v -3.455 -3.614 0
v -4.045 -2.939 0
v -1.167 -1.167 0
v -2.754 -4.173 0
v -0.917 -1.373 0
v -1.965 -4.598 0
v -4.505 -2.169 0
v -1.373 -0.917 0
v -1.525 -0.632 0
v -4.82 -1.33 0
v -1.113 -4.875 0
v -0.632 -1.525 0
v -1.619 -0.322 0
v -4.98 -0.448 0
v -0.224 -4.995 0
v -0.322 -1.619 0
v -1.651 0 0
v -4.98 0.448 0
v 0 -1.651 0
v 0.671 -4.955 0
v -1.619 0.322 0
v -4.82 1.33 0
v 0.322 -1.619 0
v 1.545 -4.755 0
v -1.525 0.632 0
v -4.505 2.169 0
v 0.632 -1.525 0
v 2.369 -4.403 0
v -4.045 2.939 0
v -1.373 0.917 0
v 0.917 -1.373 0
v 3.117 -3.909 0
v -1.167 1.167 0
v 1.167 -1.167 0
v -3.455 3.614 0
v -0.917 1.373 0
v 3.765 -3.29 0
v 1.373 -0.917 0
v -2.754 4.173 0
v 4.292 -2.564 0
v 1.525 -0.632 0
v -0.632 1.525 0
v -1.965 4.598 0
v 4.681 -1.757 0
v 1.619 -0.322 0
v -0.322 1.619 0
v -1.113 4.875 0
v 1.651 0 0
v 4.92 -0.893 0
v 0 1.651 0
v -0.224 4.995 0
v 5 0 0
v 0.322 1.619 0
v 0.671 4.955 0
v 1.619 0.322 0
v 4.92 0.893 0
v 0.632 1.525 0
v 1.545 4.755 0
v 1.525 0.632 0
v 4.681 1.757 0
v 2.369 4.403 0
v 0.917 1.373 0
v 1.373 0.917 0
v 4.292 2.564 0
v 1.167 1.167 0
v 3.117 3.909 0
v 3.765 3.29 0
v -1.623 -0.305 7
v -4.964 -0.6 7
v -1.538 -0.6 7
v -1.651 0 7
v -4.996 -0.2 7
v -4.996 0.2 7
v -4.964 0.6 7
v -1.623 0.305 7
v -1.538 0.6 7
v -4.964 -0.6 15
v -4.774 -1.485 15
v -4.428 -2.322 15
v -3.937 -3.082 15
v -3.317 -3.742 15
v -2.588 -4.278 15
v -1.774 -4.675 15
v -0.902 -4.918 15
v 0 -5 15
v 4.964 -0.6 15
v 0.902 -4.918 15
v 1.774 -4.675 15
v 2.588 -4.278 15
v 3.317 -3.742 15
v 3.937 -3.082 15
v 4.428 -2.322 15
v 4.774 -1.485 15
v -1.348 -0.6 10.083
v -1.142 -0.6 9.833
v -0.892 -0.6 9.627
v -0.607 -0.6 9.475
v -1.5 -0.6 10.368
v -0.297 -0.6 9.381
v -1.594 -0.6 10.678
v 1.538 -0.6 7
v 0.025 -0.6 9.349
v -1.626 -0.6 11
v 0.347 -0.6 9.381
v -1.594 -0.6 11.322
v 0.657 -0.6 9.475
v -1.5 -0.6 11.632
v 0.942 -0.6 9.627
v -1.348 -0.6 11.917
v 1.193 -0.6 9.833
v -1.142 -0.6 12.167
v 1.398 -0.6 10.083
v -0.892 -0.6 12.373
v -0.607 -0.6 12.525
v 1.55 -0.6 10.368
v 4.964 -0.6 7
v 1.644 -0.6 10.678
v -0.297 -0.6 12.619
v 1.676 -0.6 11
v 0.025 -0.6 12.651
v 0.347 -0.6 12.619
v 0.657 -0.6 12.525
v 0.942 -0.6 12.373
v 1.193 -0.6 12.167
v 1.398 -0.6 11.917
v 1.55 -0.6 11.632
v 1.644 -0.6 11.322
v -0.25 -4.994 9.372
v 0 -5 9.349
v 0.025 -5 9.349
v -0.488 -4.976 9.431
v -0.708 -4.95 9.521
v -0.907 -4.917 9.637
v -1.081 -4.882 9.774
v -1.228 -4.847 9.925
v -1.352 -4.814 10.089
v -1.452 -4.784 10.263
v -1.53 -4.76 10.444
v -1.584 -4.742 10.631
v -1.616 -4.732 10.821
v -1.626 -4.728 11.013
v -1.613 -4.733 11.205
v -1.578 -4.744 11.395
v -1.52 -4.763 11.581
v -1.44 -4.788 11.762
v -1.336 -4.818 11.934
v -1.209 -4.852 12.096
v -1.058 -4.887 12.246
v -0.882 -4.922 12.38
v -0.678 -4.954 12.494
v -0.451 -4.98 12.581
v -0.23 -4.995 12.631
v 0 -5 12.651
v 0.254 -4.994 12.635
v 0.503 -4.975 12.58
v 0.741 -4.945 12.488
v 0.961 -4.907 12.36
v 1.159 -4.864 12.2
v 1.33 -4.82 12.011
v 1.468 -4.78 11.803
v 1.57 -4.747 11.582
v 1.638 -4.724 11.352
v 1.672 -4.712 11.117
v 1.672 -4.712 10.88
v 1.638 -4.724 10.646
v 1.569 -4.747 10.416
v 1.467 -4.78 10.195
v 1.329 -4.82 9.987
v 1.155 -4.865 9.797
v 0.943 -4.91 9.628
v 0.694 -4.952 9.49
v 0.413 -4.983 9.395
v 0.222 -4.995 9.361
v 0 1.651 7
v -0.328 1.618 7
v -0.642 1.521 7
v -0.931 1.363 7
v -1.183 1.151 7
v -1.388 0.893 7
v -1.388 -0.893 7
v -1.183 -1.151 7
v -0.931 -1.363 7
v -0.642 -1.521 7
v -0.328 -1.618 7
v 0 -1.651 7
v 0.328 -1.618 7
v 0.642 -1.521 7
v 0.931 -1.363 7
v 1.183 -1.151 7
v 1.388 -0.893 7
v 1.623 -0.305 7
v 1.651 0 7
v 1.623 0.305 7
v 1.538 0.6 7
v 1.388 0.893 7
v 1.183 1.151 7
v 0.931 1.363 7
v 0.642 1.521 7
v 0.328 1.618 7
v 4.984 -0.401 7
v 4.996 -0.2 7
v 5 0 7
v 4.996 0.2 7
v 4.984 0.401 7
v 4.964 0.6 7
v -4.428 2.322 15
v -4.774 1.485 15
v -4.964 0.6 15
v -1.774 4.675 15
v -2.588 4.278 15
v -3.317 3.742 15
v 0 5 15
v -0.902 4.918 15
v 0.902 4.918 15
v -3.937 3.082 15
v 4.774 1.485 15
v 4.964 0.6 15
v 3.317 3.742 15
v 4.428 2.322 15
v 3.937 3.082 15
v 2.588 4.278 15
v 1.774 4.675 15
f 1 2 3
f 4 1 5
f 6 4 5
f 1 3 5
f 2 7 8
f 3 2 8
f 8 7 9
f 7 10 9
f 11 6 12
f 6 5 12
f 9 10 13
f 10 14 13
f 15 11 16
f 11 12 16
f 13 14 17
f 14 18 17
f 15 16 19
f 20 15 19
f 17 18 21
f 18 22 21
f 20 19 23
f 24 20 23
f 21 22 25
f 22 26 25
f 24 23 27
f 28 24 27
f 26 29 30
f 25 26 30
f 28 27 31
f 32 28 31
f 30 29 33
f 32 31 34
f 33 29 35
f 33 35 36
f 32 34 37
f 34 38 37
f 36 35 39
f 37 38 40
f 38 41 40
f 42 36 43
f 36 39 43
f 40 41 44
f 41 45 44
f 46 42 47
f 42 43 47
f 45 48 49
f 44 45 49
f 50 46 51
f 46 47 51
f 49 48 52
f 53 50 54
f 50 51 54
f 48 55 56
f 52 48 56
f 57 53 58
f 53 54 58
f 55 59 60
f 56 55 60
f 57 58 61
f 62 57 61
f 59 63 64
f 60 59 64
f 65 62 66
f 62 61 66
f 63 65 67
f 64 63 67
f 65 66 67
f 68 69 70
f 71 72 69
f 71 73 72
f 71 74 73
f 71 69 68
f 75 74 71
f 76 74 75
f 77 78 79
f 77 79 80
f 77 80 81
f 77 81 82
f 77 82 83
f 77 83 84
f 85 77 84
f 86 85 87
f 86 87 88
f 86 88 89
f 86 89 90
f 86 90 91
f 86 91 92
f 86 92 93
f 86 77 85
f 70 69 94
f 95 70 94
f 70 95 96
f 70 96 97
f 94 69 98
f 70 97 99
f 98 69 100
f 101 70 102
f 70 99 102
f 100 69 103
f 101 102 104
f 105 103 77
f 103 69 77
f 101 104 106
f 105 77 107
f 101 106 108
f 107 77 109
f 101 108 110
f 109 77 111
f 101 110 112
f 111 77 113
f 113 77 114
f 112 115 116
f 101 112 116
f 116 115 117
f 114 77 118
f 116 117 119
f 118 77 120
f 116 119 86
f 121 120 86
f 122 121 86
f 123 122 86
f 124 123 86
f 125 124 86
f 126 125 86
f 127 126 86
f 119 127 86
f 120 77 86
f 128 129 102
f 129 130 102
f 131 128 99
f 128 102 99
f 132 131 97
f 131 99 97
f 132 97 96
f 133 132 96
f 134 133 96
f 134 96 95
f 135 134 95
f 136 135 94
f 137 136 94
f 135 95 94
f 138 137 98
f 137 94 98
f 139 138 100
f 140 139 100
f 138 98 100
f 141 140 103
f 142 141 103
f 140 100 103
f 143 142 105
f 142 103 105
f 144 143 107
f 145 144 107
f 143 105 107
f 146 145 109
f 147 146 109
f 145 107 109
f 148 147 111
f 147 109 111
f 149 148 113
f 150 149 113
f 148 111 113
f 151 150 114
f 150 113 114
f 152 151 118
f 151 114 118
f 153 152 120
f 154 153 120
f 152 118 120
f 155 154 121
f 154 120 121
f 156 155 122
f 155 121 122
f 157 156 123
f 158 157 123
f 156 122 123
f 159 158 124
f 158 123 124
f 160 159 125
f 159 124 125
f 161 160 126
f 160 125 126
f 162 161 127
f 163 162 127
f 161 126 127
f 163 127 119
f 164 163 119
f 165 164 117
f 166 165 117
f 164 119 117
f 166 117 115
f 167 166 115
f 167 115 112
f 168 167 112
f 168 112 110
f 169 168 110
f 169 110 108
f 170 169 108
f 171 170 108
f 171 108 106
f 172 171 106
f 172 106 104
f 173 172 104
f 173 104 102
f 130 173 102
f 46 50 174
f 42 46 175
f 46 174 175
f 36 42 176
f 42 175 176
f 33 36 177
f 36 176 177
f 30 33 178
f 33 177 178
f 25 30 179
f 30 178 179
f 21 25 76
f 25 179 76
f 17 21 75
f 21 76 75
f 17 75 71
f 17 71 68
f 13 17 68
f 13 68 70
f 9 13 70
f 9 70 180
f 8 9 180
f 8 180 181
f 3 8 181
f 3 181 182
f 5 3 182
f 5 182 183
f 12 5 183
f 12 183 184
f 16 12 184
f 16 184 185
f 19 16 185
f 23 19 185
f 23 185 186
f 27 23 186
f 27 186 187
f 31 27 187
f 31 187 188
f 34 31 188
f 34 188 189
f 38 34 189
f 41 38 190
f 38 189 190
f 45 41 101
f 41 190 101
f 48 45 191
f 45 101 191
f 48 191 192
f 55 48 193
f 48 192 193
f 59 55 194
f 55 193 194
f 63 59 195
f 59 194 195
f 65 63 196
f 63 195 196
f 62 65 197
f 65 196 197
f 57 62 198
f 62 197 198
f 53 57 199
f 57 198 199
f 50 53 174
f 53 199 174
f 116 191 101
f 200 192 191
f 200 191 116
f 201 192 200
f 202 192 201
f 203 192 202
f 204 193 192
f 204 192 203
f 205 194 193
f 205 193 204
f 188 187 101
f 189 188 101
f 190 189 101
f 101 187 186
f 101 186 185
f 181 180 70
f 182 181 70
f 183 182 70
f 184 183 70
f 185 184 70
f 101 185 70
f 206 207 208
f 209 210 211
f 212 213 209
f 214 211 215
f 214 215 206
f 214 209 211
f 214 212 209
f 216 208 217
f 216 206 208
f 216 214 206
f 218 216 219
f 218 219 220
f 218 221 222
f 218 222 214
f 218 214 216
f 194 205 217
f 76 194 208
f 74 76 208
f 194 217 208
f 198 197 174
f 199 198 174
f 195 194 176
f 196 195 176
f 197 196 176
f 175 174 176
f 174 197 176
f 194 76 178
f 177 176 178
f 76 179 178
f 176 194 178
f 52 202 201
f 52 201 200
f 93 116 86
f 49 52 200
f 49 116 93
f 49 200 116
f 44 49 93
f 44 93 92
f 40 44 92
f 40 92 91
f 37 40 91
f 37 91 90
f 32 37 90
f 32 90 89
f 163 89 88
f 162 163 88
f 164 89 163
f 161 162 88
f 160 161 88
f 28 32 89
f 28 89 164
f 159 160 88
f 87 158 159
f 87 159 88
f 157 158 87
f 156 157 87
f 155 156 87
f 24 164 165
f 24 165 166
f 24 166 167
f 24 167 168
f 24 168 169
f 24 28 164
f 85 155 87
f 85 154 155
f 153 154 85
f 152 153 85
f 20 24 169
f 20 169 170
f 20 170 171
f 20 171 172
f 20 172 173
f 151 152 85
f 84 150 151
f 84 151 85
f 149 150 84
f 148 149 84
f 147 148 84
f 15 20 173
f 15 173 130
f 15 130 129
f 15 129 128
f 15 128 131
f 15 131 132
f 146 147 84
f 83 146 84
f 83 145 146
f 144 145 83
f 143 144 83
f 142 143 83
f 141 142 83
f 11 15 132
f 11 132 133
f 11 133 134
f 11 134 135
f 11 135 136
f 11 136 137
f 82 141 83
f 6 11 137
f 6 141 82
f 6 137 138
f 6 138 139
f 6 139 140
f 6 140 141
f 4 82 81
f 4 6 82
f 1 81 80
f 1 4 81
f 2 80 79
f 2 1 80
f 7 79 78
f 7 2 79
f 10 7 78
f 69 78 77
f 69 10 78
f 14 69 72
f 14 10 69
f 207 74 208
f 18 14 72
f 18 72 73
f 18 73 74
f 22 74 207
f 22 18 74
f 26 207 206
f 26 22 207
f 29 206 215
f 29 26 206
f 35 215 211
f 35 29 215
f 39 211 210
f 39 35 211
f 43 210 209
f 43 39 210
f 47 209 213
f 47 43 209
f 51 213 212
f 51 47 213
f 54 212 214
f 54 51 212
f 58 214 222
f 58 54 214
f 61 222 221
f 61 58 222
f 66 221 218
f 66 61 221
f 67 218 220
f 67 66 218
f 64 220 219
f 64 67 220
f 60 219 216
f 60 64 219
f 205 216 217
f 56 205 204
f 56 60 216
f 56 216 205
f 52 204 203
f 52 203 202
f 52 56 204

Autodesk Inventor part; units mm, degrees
ref_plane "YZ Plane" through (0, 0, 0) normal (1, 0, 0) x (0, 1, 0)
ref_plane "XZ Plane" through (0, 0, 0) normal (0, 1, 0) x (-1, 0, 0)
ref_plane "XY Plane" through (0, 0, 0) normal (0, 0, 1) x (1, 0, 0)
sketch "Sketch1" plane through (0, 0, 0) normal (0, 0, 1) x (1, 0, 0)
  circle A0 centre (0, 0) radius 5
  dimension "d0" = 10
extrude "Extrusion1" add sketch "Sketch1" along normal blind 15
sketch "Sketch2" plane through (0, 0, 15) normal (0, 0, 1) x (1, 0, 0)
  line L0 (-4.9749, -0.5) -> (4.9749, -0.5)
  line L1 (4.9749, -0.5) -> (4.9749, 0.5)
  line L2 (4.9749, 0.5) -> (-4.9749, 0.5)
  line L3 (-4.9749, 0.5) -> (-4.9749, -0.5)
  circle A0 centre (0, 0) radius 5 projected
  dimension "d3" = 1
sketch "Sketch3" plane through (0, 0, 0) normal (0, 0, -1) x (-1, 0, 0)
  circle A0 centre (0, 0) radius 1.4142
hole "Hole1" at (0, 0, 0) direction (0, 0, 1) diameter 3.302 depth 7 thread size "8-32 UNC" class "2B" standard "ANSI Unified Screw Threads"
extrude "Extrusion2" add sketch "Sketch2" along normal blind 2 contours L3 L2 L1 L0
ref_plane "Work Plane1" through (-4.9749, 5, 15) normal (0, 1, 0) x (1, 0, 0)
ref_plane "Work Plane2" through (-4.9749, -5, 15) normal (0, -1, 0) x (1, 0, 0)
sketch "Sketch5" plane through (-4.9749, -5, 15) normal (0, -1, 0) x (1, 0, 0)
  circle A0 centre (5, -4) radius 1.0003
  line L0 (9.9499, 0) -> (0, 0) projected
  point P0 (4.9749, -15)
  dimension "d16" = 4
hole "Hole2" at (0.0251, -5, 11) direction (0, 1, 0) diameter 3.302 depth 4.5 thread size "8-32 UNC" class "2B" standard "ANSI Unified Screw Threads"
sketch "Sketch6" plane through (0, 0, 15) normal (0, 0, 1) x (1, 0, 0)
  arc A0 (-4.9749, 0.5) -> (-4.9749, -0.5) centre (0, 0) ccw projected
  line L0 (4.9749, 0.5) -> (4.9749, -0.5) projected
  line L1 (-4.9749, -0.5) -> (4.9749, -0.5)
  line L2 (4.9749, -0.5) -> (4.9749, 0.5)
  line L3 (4.9749, 0.5) -> (-4.9749, 0.5)
  line L4 (-4.9749, 0.5) -> (-4.9749, -0.5)
extrude "Extrusion3" add sketch "Sketch6" against normal blind 2 contours L3 L0 L1 L4
sketch "Sketch7" plane through (0, 0, 17) normal (0, 0, 1) x (1, 0, 0)
  line L0 (5, 0.6) -> (-5, 0.6)
  line L1 (-5, 0.6) -> (-5, -0.6)
  line L2 (-5, -0.6) -> (5, -0.6)
  line L3 (5, -0.6) -> (5, 0.6)
  arc A0 (4.9749, -0.5) -> (4.9749, 0.5) centre (0, 0) ccw projected
  arc A1 (-4.9749, 0.5) -> (-4.9749, -0.5) centre (0, 0) ccw projected
  dimension "d35" = 1.2
  dimension "d36" = 0.6
extrude "Extrusion4" cut sketch "Sketch7" against normal blind 10
properties part number "slit-adapter-clear-scope_8_2018"
